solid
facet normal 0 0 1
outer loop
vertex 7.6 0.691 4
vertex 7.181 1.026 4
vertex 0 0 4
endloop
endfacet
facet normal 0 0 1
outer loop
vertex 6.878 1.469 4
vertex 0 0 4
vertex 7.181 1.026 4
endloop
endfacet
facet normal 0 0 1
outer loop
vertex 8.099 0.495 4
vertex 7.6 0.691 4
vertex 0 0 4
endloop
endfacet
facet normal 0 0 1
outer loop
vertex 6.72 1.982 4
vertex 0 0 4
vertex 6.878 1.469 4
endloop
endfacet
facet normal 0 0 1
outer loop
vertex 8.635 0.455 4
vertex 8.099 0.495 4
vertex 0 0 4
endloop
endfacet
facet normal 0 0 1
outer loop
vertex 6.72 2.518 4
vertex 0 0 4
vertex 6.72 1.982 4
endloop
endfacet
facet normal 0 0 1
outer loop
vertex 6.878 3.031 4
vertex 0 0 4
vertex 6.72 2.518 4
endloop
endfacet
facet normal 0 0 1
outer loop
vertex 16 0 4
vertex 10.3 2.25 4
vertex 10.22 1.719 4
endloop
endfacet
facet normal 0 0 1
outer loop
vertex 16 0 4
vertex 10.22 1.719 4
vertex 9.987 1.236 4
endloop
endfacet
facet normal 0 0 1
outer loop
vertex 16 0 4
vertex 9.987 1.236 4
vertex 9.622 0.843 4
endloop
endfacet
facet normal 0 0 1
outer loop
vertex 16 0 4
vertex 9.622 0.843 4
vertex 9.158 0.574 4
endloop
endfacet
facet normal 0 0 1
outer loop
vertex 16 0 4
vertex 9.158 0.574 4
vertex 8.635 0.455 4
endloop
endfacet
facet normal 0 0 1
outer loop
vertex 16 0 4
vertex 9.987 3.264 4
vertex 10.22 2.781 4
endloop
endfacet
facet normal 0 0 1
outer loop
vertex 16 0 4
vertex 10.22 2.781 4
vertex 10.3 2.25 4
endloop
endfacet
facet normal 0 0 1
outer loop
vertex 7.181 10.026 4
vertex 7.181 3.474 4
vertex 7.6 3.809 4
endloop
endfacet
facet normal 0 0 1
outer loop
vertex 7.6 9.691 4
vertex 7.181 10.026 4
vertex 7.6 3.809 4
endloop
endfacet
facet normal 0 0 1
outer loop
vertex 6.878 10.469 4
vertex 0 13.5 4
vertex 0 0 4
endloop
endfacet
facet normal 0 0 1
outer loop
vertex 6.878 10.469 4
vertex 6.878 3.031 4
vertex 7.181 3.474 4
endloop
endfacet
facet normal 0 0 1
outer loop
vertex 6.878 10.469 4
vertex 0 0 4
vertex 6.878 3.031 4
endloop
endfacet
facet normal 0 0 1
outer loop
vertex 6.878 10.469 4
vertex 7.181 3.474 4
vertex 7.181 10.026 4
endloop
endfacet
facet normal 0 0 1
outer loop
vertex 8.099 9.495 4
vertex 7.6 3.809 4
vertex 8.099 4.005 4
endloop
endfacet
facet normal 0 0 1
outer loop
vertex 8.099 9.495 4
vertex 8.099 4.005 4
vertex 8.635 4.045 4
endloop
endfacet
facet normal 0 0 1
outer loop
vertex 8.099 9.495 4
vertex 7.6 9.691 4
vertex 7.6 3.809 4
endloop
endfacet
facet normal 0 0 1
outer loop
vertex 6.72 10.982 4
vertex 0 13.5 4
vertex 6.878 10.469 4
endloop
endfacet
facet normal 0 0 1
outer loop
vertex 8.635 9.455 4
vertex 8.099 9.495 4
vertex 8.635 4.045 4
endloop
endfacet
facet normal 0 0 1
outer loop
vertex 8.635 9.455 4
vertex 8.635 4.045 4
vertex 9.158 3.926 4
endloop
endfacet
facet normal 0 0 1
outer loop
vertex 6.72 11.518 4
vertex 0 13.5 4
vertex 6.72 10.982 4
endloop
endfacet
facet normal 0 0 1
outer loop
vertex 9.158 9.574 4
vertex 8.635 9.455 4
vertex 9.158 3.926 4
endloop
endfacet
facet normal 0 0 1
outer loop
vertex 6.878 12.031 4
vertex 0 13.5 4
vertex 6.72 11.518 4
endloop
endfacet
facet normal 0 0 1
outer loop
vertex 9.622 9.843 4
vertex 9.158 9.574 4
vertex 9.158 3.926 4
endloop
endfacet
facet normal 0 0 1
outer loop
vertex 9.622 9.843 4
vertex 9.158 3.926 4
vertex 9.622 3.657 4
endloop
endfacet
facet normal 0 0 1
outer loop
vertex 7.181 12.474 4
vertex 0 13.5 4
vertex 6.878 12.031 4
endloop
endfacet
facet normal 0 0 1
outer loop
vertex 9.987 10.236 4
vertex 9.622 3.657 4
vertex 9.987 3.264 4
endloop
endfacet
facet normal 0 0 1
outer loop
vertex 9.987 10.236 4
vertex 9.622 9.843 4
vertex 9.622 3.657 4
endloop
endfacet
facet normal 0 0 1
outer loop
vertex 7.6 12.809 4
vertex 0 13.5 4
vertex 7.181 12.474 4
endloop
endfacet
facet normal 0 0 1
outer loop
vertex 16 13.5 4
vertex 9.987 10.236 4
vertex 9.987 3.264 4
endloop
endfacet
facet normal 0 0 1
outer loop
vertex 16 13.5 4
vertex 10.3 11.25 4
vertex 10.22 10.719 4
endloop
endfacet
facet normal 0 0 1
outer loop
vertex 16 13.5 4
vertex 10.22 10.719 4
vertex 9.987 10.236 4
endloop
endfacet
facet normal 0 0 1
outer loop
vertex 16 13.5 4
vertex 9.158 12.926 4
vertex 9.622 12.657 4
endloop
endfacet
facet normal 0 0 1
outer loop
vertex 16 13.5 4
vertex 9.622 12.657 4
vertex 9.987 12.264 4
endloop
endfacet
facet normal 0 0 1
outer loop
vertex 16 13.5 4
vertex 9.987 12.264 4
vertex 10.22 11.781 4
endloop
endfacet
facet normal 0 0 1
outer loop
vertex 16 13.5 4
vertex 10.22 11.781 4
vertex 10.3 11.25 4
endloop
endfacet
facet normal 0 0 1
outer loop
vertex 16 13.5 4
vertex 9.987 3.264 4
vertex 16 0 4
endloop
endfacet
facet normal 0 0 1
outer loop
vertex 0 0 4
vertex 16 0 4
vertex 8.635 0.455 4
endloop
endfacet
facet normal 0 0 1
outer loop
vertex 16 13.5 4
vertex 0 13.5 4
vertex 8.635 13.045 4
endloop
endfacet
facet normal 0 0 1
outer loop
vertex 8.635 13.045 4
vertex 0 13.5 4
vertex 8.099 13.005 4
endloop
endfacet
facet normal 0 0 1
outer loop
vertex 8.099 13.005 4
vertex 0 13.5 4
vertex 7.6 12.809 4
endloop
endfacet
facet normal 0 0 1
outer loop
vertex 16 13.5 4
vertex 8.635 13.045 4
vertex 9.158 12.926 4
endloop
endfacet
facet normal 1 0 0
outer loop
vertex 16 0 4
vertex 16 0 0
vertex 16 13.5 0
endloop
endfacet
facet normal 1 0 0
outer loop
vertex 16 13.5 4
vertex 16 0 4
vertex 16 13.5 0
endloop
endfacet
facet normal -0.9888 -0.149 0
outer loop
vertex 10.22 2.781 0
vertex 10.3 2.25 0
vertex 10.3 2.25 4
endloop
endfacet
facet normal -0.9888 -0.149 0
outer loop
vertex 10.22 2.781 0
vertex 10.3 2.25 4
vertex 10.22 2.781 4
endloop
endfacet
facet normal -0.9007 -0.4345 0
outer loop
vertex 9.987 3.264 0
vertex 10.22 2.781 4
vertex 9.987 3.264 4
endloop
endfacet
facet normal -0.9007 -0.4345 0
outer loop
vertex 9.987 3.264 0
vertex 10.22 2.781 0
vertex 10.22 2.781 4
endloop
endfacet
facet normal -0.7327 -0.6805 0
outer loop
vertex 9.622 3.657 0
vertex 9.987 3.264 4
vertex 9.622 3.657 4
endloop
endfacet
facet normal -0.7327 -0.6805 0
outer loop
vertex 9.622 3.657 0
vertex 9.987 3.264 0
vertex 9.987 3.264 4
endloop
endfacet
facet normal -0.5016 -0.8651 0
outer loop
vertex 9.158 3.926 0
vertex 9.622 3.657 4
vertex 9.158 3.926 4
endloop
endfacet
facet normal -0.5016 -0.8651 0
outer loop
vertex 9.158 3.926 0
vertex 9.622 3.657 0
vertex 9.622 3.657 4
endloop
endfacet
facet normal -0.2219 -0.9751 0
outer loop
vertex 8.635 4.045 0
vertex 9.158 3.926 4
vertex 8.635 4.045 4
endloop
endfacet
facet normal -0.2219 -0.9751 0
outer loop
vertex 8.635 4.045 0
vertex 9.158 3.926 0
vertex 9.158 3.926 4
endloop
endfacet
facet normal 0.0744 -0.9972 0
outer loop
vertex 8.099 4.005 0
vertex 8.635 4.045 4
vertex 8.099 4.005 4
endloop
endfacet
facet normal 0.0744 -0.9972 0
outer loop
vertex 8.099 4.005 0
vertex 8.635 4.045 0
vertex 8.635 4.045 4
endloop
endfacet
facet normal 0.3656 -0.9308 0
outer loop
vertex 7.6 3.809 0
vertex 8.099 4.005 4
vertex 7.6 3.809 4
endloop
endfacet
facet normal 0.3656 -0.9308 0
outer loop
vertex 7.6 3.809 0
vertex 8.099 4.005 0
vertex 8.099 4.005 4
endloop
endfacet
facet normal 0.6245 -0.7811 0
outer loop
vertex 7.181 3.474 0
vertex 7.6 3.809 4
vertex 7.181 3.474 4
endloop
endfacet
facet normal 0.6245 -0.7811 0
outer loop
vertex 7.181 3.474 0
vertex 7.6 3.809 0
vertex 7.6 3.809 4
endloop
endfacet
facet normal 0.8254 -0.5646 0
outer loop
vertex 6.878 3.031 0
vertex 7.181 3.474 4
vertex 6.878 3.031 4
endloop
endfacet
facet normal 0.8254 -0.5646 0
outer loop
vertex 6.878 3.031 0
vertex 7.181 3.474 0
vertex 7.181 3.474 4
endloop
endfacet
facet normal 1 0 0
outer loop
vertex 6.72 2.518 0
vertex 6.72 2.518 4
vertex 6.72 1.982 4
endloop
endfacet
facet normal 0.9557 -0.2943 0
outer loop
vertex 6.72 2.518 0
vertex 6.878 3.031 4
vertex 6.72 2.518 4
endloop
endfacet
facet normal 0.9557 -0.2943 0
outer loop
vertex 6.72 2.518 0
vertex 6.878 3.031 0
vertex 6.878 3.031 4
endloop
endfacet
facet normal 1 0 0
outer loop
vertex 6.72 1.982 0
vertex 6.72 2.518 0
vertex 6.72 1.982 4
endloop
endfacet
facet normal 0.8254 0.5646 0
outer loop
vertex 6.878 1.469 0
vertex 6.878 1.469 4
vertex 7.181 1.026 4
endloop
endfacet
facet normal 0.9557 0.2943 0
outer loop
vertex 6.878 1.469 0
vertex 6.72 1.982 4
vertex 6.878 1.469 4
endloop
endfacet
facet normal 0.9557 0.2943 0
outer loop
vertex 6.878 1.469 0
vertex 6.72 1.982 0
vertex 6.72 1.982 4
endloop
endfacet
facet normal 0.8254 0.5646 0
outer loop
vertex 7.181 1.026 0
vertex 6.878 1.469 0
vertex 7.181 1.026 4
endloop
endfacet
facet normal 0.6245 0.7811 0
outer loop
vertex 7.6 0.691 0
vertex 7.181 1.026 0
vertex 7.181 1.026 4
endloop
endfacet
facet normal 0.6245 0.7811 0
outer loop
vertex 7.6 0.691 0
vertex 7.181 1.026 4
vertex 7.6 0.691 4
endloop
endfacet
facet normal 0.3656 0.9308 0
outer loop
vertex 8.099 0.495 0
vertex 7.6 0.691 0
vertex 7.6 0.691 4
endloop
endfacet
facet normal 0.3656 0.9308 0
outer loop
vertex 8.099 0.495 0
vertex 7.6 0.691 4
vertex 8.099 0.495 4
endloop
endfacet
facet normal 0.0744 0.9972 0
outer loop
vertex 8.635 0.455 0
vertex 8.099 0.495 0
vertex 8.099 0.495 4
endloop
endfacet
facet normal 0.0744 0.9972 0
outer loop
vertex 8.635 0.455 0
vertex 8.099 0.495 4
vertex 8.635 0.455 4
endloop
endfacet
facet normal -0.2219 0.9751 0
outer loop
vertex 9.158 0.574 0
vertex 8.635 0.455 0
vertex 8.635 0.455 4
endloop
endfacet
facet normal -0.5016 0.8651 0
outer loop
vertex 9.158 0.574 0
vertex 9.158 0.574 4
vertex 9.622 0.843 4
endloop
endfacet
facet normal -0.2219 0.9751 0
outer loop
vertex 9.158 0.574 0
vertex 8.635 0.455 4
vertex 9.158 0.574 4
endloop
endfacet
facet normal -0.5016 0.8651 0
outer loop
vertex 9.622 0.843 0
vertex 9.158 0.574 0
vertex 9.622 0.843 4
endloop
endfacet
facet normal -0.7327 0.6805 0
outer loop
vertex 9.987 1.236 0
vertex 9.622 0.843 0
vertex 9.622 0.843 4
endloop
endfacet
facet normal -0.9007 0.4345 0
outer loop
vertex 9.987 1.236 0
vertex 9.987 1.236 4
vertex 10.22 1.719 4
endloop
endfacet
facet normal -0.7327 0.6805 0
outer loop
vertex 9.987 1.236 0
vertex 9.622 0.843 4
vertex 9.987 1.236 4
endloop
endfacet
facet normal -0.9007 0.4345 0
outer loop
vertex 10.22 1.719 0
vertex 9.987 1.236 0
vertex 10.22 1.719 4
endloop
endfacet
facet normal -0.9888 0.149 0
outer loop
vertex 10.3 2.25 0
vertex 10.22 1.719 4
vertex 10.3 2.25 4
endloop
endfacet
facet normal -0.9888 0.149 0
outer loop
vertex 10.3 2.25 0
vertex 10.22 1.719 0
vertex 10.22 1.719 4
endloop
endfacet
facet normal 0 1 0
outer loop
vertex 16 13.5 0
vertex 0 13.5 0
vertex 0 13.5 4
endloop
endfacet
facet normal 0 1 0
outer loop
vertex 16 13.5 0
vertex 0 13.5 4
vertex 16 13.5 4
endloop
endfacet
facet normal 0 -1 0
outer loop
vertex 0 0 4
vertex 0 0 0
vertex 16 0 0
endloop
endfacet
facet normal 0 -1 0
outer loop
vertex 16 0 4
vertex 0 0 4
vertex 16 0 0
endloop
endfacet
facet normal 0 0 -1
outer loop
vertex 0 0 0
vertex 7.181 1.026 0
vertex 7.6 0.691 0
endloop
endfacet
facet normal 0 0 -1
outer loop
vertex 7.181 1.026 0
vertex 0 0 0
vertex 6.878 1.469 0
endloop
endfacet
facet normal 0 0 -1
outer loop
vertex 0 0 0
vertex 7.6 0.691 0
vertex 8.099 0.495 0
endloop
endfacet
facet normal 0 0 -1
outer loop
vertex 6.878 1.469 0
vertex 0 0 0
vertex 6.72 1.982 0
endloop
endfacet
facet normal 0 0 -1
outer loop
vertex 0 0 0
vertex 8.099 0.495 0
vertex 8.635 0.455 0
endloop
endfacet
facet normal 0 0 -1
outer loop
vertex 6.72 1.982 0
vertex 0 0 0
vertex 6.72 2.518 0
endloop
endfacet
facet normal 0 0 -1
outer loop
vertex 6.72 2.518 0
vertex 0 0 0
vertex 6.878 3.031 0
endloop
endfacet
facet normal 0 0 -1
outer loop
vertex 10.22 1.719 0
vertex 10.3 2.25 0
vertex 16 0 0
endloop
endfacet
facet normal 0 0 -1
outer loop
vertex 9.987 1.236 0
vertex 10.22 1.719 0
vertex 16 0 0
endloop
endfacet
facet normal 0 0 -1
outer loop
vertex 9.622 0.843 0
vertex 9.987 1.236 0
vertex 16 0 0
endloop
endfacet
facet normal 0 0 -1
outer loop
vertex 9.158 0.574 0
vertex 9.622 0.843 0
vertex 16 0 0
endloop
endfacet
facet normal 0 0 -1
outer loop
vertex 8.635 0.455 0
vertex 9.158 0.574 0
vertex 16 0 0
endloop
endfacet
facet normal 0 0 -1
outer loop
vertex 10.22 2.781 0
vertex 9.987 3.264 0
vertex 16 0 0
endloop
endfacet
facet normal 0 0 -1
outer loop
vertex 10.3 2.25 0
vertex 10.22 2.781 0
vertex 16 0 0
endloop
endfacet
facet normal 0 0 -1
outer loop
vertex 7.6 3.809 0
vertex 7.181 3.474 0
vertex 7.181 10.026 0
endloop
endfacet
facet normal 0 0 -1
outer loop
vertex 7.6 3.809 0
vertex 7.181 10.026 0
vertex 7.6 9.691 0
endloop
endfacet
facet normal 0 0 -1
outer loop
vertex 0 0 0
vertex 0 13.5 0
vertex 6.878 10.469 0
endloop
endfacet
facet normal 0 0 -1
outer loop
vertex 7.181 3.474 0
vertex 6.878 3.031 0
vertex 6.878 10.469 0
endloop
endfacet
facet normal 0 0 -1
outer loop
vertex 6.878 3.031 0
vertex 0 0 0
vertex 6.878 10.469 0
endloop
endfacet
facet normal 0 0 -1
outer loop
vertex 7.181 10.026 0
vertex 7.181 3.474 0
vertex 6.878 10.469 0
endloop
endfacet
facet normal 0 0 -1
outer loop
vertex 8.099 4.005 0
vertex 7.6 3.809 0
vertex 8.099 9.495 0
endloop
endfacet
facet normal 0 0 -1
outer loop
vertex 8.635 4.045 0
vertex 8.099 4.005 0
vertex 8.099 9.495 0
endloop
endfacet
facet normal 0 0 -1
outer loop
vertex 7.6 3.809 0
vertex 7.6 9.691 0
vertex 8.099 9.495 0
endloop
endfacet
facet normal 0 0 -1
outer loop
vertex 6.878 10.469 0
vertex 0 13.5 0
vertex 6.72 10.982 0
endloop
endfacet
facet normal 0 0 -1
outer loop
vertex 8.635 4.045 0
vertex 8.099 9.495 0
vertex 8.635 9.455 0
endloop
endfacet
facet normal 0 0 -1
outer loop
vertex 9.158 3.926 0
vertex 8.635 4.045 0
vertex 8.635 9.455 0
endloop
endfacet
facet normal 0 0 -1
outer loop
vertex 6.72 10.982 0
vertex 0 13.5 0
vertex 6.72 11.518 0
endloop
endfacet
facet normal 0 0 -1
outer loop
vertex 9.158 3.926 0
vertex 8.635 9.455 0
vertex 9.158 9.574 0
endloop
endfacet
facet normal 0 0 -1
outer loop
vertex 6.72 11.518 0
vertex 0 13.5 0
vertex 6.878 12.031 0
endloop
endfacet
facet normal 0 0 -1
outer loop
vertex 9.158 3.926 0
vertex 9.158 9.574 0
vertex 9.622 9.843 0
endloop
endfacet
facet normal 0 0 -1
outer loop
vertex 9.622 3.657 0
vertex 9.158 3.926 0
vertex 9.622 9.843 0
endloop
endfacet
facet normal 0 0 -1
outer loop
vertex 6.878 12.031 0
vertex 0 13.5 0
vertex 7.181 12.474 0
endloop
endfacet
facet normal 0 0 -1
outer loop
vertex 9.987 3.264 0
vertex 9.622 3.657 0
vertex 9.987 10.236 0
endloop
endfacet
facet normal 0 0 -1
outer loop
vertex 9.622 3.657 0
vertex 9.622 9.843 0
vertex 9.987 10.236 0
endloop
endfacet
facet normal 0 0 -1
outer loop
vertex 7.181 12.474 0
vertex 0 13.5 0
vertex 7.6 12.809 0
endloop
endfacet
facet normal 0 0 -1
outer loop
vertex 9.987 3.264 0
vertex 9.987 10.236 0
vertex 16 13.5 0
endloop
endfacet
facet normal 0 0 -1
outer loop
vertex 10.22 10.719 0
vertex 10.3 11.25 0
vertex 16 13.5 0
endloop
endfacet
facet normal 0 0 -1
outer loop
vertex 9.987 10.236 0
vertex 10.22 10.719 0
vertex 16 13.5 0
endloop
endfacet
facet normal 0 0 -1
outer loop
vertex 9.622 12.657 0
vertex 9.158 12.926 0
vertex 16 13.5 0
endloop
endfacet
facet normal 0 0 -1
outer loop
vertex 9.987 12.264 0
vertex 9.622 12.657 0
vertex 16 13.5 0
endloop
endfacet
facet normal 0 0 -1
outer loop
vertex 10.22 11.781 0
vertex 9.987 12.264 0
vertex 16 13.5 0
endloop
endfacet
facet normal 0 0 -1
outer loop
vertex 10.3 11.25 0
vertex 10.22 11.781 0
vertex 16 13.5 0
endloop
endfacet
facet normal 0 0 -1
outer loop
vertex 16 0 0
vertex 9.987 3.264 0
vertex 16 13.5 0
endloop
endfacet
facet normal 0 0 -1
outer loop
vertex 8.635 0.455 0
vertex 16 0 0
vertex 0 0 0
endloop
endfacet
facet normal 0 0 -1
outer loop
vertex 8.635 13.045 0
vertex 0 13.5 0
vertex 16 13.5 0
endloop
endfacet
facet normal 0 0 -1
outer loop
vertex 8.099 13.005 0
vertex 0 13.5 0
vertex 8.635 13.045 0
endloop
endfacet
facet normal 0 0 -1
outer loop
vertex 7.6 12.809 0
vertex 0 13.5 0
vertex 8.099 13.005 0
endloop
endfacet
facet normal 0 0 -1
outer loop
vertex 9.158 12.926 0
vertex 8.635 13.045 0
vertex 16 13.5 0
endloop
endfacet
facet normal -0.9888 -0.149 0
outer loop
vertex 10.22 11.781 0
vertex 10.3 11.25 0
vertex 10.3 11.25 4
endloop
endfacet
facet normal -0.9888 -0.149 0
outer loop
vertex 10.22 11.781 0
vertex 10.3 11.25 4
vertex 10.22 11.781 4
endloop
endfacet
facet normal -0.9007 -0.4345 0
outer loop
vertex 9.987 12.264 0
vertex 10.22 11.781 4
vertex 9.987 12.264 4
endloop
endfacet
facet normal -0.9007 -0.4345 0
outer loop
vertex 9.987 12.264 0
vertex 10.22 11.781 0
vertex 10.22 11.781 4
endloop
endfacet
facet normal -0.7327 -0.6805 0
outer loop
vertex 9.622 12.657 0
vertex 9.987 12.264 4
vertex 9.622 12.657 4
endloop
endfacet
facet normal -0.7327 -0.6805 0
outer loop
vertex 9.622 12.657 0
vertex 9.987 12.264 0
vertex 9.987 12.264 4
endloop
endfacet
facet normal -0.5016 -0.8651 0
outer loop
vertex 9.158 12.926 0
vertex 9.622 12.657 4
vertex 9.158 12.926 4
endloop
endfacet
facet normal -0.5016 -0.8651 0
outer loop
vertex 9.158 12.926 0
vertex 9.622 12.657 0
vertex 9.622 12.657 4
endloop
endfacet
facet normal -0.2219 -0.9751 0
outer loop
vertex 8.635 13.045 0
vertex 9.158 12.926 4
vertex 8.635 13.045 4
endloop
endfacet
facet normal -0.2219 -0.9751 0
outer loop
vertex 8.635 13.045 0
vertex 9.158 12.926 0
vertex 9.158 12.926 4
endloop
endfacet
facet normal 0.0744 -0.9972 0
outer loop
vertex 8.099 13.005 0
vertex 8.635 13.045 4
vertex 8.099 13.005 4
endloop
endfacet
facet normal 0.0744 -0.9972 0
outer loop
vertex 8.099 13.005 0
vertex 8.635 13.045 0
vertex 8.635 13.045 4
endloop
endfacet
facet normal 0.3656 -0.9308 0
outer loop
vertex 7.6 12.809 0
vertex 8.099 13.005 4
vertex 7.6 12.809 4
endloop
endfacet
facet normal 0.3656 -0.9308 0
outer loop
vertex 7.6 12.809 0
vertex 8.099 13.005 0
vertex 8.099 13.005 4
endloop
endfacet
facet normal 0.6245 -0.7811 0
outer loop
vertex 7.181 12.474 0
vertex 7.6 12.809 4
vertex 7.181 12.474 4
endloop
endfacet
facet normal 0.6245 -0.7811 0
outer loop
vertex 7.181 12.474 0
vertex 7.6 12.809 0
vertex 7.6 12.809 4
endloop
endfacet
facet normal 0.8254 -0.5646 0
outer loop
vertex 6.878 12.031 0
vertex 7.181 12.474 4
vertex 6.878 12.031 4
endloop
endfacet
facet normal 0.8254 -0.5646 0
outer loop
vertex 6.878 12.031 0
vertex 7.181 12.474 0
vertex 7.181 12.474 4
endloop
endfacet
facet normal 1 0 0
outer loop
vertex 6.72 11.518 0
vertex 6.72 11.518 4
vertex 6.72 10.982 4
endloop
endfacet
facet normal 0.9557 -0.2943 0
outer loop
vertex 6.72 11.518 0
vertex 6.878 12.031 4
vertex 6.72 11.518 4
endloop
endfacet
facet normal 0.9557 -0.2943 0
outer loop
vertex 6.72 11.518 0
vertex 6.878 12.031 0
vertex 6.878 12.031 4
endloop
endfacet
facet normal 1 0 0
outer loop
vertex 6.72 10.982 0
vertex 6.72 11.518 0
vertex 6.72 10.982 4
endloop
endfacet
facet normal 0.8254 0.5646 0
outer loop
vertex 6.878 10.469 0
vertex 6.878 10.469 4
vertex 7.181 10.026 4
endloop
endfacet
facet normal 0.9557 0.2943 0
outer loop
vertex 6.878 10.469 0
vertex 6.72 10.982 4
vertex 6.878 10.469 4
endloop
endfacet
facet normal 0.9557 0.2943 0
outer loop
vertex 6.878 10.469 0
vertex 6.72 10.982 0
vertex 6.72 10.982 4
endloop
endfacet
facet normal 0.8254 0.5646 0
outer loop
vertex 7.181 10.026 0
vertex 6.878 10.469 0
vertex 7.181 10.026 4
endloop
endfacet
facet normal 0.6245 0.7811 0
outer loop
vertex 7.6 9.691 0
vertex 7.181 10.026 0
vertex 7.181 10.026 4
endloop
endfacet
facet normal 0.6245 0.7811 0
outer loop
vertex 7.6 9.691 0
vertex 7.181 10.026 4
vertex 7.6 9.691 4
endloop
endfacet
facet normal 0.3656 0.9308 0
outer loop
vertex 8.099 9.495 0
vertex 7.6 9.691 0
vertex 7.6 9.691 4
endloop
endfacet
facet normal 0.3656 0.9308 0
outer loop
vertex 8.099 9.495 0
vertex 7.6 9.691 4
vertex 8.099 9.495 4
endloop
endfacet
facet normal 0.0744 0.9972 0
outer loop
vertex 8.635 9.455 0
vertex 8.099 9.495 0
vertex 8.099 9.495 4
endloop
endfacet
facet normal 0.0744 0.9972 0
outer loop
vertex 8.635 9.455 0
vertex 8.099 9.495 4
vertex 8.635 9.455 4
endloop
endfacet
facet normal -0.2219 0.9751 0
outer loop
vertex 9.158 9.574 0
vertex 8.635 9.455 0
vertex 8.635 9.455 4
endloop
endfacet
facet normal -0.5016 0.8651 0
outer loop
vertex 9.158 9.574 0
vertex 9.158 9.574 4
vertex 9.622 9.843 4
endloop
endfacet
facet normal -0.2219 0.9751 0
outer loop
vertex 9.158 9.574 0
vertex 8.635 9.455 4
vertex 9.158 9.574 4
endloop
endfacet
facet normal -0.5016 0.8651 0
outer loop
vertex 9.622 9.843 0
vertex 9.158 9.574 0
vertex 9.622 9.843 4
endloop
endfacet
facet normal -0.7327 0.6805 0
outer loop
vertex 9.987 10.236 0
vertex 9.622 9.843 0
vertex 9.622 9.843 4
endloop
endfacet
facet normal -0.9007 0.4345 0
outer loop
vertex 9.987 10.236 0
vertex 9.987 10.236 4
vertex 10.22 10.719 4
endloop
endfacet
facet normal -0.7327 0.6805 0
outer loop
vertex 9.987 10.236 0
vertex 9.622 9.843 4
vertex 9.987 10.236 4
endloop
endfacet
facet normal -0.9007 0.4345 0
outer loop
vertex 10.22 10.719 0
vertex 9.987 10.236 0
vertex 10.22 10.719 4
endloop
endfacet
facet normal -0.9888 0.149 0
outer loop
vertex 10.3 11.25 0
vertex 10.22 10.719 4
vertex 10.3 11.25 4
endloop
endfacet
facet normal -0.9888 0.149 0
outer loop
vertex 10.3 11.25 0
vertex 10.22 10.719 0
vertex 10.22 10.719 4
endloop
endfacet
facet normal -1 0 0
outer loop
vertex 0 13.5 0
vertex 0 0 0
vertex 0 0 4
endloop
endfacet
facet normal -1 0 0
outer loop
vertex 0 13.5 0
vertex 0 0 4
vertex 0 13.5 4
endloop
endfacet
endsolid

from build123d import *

# Parameters (mm, degrees)
CYLINDER001_R     = 1.8
CYLINDER001_DEPTH = 50
ARRAY001_Y_COUNT  = 2
ARRAY001_Y_PITCH  = 9
BOX002_W          = 16
BOX002_H          = 13.5
BOX002_DEPTH      = 4


with BuildPart() as array001:
    # Cylinder001 → Cylinder001 (new body)
    with BuildSketch(Plane(origin=(8.5, 2.25, -10), x_dir=(1, 0, 0), z_dir=(0, 0, 1))):
        Circle(CYLINDER001_R)
    extrude(amount=CYLINDER001_DEPTH)

    # Array001 Y: Array001 ×2


with BuildPart() as array001_1:
    add(array001.part)
    with Locations(*[(0, i * ARRAY001_Y_PITCH, 0) for i in range(1, ARRAY001_Y_COUNT)]):
        add(array001.part)


with BuildPart() as cut001:
    # Box002 → Box002 (new body)
    with BuildSketch(Plane.XY):
        with Locations((8, 6.75)):
            Rectangle(BOX002_W, BOX002_H)
    extrude(amount=BOX002_DEPTH)

    # Cut001: cut Array001
    add(array001_1.part, mode=Mode.SUBTRACT)


solid = cut001.part
